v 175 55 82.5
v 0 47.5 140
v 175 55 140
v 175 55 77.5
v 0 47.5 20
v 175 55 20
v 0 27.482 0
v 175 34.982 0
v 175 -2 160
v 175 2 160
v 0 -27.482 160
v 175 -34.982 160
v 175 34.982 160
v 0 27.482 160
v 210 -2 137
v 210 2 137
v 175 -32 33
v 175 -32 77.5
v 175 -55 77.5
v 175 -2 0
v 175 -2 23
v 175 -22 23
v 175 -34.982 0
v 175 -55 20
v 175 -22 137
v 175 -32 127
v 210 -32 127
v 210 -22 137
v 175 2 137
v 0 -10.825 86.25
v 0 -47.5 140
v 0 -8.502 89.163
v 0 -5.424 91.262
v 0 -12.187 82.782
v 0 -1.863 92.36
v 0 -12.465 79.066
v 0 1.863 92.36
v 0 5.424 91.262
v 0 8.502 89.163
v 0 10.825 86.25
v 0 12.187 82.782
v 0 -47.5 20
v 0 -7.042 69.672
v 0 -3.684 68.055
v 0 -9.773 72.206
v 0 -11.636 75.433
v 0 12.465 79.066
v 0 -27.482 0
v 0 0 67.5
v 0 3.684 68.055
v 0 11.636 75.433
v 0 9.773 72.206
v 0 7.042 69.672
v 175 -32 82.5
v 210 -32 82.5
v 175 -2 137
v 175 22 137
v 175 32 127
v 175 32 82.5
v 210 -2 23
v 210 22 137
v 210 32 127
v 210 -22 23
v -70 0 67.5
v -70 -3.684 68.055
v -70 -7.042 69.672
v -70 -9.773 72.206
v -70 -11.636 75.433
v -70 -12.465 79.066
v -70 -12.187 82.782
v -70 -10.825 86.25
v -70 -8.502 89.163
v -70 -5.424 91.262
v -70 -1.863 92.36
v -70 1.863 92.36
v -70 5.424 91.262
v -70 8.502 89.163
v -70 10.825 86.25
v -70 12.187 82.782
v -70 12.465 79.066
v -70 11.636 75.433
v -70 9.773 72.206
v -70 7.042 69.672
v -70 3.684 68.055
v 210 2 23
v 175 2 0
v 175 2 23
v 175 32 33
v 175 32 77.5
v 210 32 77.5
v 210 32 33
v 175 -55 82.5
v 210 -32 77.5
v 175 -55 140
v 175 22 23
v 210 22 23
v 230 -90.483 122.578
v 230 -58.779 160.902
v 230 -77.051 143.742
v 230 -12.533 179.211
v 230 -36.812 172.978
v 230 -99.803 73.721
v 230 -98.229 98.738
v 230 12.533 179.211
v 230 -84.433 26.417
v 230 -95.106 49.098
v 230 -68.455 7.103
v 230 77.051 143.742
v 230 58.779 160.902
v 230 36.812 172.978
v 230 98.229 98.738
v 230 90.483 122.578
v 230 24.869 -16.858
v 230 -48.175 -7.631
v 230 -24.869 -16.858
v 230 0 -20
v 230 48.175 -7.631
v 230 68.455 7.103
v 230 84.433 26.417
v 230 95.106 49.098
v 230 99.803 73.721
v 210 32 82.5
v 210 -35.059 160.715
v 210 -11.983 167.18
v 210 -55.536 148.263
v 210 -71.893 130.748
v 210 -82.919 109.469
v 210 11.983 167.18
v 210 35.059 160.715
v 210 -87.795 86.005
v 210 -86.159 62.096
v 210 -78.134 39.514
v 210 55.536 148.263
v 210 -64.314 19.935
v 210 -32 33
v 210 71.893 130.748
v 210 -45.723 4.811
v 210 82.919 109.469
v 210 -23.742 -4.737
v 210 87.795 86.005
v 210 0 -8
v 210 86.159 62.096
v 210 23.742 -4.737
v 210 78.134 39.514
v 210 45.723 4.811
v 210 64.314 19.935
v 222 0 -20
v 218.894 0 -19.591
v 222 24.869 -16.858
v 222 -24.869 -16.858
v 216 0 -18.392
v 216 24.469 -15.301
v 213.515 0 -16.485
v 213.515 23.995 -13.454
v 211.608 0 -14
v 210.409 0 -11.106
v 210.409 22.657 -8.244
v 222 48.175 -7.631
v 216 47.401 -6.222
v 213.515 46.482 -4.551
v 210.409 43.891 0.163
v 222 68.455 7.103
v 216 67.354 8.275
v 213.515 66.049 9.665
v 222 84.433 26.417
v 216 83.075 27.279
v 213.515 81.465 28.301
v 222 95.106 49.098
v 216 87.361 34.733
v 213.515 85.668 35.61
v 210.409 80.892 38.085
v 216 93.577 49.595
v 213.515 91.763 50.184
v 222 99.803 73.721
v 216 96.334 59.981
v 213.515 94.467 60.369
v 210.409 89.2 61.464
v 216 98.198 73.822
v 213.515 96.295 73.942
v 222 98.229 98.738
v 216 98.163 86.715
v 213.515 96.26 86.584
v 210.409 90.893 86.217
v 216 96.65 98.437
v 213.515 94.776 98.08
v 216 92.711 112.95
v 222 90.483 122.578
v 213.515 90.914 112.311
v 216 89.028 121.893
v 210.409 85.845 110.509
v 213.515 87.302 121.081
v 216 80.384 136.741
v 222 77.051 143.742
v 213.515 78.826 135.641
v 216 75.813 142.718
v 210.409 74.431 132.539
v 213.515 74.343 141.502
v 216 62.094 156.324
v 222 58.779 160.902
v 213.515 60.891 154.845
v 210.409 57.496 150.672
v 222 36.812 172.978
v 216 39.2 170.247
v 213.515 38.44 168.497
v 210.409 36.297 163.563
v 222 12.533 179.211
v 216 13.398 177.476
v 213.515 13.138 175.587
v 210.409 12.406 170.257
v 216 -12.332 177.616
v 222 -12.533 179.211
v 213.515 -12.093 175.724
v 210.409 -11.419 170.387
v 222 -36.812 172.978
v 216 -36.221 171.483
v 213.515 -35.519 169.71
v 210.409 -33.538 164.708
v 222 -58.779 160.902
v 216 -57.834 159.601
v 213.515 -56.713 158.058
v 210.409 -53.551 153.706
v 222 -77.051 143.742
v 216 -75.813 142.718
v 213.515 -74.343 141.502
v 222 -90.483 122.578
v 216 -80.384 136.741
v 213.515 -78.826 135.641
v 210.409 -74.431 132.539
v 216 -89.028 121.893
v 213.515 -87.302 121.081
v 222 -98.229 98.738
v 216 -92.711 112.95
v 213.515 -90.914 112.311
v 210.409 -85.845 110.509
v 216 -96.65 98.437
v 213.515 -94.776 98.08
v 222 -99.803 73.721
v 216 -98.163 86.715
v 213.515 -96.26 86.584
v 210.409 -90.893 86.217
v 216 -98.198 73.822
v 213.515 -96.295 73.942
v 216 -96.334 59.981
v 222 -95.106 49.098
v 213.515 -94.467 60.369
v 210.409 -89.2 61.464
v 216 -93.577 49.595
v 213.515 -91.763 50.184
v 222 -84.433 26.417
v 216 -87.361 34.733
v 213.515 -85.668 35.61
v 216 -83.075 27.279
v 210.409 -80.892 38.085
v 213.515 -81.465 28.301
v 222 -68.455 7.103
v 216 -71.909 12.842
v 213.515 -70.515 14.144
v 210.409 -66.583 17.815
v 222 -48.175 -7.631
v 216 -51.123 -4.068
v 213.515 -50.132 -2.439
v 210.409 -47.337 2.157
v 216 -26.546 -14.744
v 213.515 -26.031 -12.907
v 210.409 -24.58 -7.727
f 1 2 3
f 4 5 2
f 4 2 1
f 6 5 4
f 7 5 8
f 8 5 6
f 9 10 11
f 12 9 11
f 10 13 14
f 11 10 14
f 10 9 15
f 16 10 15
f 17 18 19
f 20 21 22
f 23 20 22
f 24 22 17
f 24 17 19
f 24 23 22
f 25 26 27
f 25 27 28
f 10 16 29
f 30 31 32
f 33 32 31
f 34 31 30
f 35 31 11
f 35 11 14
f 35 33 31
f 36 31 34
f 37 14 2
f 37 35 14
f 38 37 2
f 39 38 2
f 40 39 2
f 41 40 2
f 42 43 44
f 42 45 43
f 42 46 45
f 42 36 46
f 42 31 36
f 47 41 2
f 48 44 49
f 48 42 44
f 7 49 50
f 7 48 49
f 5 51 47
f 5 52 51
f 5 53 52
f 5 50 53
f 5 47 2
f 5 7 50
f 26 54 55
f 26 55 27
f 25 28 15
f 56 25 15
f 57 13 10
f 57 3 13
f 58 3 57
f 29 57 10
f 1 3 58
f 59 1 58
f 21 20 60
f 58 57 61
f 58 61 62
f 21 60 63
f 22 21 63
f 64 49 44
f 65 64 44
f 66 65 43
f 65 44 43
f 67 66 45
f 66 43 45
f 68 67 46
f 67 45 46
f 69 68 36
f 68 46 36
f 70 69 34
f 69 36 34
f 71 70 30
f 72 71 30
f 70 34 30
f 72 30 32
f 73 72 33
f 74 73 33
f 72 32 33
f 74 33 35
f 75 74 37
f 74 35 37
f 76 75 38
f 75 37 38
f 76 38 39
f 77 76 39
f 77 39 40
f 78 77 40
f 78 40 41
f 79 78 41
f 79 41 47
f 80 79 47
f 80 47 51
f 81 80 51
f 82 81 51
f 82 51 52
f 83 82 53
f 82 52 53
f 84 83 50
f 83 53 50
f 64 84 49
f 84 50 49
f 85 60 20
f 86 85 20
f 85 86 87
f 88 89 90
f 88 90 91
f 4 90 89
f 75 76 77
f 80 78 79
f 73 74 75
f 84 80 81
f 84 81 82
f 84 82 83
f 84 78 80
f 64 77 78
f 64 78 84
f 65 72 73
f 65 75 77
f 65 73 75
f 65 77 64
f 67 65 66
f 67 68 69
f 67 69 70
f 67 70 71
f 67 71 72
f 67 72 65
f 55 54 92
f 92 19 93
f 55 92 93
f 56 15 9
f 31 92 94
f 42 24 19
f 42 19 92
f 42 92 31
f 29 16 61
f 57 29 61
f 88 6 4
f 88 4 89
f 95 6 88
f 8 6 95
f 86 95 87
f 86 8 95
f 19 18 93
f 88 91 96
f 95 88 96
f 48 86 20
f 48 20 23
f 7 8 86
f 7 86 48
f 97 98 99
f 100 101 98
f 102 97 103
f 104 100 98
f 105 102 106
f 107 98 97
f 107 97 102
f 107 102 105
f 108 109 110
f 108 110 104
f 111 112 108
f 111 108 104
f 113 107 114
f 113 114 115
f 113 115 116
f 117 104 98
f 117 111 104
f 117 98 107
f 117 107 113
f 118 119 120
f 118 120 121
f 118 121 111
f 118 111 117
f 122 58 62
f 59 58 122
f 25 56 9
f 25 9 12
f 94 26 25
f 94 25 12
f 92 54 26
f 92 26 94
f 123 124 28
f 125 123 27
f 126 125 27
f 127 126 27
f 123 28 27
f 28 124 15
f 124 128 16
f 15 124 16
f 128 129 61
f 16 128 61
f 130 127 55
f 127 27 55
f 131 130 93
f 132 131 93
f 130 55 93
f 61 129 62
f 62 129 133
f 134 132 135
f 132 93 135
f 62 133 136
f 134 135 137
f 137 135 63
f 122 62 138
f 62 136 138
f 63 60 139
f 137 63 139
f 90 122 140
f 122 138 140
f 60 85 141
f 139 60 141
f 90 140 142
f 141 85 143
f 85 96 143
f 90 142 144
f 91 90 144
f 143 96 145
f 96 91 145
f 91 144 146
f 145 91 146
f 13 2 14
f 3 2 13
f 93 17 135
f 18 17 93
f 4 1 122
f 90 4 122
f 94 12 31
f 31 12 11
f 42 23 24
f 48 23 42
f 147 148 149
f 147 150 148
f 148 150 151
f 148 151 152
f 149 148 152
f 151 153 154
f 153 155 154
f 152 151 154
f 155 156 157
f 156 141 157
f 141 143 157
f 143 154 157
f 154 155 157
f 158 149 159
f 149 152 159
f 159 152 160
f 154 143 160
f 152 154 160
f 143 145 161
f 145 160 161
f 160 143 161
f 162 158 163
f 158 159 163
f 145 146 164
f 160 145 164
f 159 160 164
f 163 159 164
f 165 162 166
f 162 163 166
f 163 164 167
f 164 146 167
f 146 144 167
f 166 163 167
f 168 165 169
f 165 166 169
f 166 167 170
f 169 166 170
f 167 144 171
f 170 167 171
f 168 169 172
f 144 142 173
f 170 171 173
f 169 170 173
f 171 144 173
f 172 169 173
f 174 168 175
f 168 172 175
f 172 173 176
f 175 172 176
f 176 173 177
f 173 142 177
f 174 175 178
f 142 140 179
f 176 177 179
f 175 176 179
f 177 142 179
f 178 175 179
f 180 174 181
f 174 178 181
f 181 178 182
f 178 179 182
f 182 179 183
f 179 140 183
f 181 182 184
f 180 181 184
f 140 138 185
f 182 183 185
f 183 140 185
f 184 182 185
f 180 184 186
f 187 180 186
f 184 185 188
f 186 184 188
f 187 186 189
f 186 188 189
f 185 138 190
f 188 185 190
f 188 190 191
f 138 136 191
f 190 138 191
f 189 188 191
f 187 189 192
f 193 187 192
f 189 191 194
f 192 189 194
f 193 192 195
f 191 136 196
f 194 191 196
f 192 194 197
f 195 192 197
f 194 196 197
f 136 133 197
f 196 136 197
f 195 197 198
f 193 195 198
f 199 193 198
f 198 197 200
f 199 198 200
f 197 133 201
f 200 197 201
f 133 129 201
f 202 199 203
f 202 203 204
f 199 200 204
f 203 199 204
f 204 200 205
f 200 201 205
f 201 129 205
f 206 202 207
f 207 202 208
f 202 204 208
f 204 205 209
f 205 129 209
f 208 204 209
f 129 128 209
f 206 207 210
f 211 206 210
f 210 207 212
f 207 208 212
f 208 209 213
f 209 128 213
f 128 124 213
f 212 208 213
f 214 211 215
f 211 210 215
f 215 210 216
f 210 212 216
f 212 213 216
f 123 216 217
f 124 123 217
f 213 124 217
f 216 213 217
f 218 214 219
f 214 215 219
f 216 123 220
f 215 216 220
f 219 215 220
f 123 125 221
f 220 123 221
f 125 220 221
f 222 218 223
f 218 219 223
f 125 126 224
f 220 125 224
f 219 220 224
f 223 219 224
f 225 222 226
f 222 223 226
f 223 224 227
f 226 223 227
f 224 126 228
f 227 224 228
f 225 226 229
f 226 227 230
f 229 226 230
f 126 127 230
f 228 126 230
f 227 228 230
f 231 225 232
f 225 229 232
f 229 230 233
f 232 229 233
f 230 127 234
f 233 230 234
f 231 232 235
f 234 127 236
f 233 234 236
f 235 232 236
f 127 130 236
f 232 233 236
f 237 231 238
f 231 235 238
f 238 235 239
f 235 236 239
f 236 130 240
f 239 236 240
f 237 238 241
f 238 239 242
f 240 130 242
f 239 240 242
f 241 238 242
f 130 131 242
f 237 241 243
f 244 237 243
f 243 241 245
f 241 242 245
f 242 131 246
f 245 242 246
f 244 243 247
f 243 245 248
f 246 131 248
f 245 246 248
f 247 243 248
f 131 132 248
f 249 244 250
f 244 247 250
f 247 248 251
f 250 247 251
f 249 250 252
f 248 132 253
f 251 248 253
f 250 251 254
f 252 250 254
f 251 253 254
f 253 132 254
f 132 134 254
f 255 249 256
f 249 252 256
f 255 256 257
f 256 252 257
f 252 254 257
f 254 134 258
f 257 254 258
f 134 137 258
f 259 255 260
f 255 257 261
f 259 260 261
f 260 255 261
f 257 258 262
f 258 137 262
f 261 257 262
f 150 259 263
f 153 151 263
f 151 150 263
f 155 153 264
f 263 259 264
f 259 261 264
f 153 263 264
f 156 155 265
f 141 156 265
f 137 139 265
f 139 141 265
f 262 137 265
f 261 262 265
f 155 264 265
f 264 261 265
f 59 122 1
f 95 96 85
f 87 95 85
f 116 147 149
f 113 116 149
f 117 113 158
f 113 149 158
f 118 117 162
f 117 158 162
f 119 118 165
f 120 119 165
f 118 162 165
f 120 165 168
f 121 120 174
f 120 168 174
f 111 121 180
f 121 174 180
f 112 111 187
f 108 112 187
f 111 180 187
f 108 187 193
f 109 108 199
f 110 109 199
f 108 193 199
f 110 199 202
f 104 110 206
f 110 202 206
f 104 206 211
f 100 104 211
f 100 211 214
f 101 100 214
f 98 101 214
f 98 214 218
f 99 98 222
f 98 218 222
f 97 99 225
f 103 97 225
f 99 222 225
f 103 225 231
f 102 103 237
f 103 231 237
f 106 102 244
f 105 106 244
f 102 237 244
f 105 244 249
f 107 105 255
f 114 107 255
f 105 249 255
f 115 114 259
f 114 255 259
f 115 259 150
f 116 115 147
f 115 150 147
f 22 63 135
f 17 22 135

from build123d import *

# Parameters (mm, degrees)
BOSS_EXTRU_1_DEPTH           = 160
ESQUISSE3_R                  = 12.5
BOSS_EXTRU_3_DEPTH           = 70
CHANFREIN9_SIZE              = 20
BOSS_EXTRU_4_DEPTH           = 35
BOSS_EXTRU_5_DEPTH           = 2.5
R_P_TITION_START             = 77.5
R_P_TITION_CIRCULAIRE1_DEPTH = 5
BOSS_EXTRU_6_START           = -32
BOSS_EXTRU_6_DEPTH           = 2
R_P_TITION_START_2           = -2
R_P_TITION_CIRCULAIRE2_DEPTH = 4
ESQUISSE10_R                 = 100
BOSS_EXTRU_7_DEPTH           = 20
CONG_3_R                     = 12


# Read off the part's stored shape, not the designer's step: Répétition circulaire1, Répétition circulaire2
with BuildPart() as part:
    # Esquisse1 → Boss.-Extru.1 (new body)
    with BuildSketch(Plane.XY):
        Polygon((0, -47.5), (0, 47.5), (175, 55), (175, -55), align=None)
    extrude(amount=BOSS_EXTRU_1_DEPTH)

    # Esquisse3 → Boss.-Extru.3 (add)
    with BuildSketch(Plane.ZY):
        with Locations(Location((80, 0, 0), (0, 0, 180))):
            Circle(ESQUISSE3_R)
    extrude(amount=BOSS_EXTRU_3_DEPTH)

    # Chanfrein9
    chanfrein9_edges = [part.edges().sort_by_distance(p)[0] for p in [
        (87.5, -51.25, 160),
        (87.5, 51.25, 160),
        (87.5, -51.25, 0),
        (87.5, 51.25, 0),
    ]]
    chamfer(chanfrein9_edges, length=CHANFREIN9_SIZE)

    # Esquisse4 → Boss.-Extru.4 (add)
    with BuildSketch(Plane(origin=(175, 0, 0), x_dir=(0, 0, -1), z_dir=(1, 0, 0))):
        Polygon((-127, 32), (-33, 32), (-23, 22), (-23, -22), (-33, -32), (-127, -32), (-137, -22), (-137, 22), align=None)
    extrude(amount=BOSS_EXTRU_4_DEPTH)

    # Esquisse5 → Boss.-Extru.5 (add, symmetric)
    with BuildSketch(Plane.XY.offset(80)):
        Polygon((175, 55), (210, 32), (175, 32), align=None)
    extrude(amount=BOSS_EXTRU_5_DEPTH, both=True)

    # Répétition circulaire1 outline → Répétition circulaire1 (add)
    with BuildSketch(Plane.XY.offset(R_P_TITION_START)):
        Polygon((175, -32), (175, -55), (210, -32), align=None)
    extrude(amount=R_P_TITION_CIRCULAIRE1_DEPTH)

    # Esquisse8 → Boss.-Extru.6 (add, symmetric)
    with BuildSketch(Plane.XZ.offset(32).offset(BOSS_EXTRU_6_START)):
        Polygon((175, 160), (210, 137), (175, 137), align=None)
    extrude(amount=BOSS_EXTRU_6_DEPTH, both=True)

    # Répétition circulaire2 outline → Répétition circulaire2 (add)
    with BuildSketch(Plane(origin=(0, 0, 0), x_dir=(1, 0, 0), z_dir=(0, 1, 0)).offset(R_P_TITION_START_2)):
        Polygon((175, -23), (210, -23), (175, 0), align=None)
    extrude(amount=R_P_TITION_CIRCULAIRE2_DEPTH)

    # Esquisse10 → Boss.-Extru.7 (add)
    with BuildSketch(Plane(origin=(210, 0, 0), x_dir=(0, 0, -1), z_dir=(1, 0, 0))):
        with Locations((-80, 0)):
            Circle(ESQUISSE10_R)
    extrude(amount=BOSS_EXTRU_7_DEPTH)

    # Congé3
    cong_3_edges = [part.edges().sort_by_distance(p)[0] for p in [
        (210, 0, 180),
    ]]
    fillet(cong_3_edges, radius=CONG_3_R)


solid = part.part
